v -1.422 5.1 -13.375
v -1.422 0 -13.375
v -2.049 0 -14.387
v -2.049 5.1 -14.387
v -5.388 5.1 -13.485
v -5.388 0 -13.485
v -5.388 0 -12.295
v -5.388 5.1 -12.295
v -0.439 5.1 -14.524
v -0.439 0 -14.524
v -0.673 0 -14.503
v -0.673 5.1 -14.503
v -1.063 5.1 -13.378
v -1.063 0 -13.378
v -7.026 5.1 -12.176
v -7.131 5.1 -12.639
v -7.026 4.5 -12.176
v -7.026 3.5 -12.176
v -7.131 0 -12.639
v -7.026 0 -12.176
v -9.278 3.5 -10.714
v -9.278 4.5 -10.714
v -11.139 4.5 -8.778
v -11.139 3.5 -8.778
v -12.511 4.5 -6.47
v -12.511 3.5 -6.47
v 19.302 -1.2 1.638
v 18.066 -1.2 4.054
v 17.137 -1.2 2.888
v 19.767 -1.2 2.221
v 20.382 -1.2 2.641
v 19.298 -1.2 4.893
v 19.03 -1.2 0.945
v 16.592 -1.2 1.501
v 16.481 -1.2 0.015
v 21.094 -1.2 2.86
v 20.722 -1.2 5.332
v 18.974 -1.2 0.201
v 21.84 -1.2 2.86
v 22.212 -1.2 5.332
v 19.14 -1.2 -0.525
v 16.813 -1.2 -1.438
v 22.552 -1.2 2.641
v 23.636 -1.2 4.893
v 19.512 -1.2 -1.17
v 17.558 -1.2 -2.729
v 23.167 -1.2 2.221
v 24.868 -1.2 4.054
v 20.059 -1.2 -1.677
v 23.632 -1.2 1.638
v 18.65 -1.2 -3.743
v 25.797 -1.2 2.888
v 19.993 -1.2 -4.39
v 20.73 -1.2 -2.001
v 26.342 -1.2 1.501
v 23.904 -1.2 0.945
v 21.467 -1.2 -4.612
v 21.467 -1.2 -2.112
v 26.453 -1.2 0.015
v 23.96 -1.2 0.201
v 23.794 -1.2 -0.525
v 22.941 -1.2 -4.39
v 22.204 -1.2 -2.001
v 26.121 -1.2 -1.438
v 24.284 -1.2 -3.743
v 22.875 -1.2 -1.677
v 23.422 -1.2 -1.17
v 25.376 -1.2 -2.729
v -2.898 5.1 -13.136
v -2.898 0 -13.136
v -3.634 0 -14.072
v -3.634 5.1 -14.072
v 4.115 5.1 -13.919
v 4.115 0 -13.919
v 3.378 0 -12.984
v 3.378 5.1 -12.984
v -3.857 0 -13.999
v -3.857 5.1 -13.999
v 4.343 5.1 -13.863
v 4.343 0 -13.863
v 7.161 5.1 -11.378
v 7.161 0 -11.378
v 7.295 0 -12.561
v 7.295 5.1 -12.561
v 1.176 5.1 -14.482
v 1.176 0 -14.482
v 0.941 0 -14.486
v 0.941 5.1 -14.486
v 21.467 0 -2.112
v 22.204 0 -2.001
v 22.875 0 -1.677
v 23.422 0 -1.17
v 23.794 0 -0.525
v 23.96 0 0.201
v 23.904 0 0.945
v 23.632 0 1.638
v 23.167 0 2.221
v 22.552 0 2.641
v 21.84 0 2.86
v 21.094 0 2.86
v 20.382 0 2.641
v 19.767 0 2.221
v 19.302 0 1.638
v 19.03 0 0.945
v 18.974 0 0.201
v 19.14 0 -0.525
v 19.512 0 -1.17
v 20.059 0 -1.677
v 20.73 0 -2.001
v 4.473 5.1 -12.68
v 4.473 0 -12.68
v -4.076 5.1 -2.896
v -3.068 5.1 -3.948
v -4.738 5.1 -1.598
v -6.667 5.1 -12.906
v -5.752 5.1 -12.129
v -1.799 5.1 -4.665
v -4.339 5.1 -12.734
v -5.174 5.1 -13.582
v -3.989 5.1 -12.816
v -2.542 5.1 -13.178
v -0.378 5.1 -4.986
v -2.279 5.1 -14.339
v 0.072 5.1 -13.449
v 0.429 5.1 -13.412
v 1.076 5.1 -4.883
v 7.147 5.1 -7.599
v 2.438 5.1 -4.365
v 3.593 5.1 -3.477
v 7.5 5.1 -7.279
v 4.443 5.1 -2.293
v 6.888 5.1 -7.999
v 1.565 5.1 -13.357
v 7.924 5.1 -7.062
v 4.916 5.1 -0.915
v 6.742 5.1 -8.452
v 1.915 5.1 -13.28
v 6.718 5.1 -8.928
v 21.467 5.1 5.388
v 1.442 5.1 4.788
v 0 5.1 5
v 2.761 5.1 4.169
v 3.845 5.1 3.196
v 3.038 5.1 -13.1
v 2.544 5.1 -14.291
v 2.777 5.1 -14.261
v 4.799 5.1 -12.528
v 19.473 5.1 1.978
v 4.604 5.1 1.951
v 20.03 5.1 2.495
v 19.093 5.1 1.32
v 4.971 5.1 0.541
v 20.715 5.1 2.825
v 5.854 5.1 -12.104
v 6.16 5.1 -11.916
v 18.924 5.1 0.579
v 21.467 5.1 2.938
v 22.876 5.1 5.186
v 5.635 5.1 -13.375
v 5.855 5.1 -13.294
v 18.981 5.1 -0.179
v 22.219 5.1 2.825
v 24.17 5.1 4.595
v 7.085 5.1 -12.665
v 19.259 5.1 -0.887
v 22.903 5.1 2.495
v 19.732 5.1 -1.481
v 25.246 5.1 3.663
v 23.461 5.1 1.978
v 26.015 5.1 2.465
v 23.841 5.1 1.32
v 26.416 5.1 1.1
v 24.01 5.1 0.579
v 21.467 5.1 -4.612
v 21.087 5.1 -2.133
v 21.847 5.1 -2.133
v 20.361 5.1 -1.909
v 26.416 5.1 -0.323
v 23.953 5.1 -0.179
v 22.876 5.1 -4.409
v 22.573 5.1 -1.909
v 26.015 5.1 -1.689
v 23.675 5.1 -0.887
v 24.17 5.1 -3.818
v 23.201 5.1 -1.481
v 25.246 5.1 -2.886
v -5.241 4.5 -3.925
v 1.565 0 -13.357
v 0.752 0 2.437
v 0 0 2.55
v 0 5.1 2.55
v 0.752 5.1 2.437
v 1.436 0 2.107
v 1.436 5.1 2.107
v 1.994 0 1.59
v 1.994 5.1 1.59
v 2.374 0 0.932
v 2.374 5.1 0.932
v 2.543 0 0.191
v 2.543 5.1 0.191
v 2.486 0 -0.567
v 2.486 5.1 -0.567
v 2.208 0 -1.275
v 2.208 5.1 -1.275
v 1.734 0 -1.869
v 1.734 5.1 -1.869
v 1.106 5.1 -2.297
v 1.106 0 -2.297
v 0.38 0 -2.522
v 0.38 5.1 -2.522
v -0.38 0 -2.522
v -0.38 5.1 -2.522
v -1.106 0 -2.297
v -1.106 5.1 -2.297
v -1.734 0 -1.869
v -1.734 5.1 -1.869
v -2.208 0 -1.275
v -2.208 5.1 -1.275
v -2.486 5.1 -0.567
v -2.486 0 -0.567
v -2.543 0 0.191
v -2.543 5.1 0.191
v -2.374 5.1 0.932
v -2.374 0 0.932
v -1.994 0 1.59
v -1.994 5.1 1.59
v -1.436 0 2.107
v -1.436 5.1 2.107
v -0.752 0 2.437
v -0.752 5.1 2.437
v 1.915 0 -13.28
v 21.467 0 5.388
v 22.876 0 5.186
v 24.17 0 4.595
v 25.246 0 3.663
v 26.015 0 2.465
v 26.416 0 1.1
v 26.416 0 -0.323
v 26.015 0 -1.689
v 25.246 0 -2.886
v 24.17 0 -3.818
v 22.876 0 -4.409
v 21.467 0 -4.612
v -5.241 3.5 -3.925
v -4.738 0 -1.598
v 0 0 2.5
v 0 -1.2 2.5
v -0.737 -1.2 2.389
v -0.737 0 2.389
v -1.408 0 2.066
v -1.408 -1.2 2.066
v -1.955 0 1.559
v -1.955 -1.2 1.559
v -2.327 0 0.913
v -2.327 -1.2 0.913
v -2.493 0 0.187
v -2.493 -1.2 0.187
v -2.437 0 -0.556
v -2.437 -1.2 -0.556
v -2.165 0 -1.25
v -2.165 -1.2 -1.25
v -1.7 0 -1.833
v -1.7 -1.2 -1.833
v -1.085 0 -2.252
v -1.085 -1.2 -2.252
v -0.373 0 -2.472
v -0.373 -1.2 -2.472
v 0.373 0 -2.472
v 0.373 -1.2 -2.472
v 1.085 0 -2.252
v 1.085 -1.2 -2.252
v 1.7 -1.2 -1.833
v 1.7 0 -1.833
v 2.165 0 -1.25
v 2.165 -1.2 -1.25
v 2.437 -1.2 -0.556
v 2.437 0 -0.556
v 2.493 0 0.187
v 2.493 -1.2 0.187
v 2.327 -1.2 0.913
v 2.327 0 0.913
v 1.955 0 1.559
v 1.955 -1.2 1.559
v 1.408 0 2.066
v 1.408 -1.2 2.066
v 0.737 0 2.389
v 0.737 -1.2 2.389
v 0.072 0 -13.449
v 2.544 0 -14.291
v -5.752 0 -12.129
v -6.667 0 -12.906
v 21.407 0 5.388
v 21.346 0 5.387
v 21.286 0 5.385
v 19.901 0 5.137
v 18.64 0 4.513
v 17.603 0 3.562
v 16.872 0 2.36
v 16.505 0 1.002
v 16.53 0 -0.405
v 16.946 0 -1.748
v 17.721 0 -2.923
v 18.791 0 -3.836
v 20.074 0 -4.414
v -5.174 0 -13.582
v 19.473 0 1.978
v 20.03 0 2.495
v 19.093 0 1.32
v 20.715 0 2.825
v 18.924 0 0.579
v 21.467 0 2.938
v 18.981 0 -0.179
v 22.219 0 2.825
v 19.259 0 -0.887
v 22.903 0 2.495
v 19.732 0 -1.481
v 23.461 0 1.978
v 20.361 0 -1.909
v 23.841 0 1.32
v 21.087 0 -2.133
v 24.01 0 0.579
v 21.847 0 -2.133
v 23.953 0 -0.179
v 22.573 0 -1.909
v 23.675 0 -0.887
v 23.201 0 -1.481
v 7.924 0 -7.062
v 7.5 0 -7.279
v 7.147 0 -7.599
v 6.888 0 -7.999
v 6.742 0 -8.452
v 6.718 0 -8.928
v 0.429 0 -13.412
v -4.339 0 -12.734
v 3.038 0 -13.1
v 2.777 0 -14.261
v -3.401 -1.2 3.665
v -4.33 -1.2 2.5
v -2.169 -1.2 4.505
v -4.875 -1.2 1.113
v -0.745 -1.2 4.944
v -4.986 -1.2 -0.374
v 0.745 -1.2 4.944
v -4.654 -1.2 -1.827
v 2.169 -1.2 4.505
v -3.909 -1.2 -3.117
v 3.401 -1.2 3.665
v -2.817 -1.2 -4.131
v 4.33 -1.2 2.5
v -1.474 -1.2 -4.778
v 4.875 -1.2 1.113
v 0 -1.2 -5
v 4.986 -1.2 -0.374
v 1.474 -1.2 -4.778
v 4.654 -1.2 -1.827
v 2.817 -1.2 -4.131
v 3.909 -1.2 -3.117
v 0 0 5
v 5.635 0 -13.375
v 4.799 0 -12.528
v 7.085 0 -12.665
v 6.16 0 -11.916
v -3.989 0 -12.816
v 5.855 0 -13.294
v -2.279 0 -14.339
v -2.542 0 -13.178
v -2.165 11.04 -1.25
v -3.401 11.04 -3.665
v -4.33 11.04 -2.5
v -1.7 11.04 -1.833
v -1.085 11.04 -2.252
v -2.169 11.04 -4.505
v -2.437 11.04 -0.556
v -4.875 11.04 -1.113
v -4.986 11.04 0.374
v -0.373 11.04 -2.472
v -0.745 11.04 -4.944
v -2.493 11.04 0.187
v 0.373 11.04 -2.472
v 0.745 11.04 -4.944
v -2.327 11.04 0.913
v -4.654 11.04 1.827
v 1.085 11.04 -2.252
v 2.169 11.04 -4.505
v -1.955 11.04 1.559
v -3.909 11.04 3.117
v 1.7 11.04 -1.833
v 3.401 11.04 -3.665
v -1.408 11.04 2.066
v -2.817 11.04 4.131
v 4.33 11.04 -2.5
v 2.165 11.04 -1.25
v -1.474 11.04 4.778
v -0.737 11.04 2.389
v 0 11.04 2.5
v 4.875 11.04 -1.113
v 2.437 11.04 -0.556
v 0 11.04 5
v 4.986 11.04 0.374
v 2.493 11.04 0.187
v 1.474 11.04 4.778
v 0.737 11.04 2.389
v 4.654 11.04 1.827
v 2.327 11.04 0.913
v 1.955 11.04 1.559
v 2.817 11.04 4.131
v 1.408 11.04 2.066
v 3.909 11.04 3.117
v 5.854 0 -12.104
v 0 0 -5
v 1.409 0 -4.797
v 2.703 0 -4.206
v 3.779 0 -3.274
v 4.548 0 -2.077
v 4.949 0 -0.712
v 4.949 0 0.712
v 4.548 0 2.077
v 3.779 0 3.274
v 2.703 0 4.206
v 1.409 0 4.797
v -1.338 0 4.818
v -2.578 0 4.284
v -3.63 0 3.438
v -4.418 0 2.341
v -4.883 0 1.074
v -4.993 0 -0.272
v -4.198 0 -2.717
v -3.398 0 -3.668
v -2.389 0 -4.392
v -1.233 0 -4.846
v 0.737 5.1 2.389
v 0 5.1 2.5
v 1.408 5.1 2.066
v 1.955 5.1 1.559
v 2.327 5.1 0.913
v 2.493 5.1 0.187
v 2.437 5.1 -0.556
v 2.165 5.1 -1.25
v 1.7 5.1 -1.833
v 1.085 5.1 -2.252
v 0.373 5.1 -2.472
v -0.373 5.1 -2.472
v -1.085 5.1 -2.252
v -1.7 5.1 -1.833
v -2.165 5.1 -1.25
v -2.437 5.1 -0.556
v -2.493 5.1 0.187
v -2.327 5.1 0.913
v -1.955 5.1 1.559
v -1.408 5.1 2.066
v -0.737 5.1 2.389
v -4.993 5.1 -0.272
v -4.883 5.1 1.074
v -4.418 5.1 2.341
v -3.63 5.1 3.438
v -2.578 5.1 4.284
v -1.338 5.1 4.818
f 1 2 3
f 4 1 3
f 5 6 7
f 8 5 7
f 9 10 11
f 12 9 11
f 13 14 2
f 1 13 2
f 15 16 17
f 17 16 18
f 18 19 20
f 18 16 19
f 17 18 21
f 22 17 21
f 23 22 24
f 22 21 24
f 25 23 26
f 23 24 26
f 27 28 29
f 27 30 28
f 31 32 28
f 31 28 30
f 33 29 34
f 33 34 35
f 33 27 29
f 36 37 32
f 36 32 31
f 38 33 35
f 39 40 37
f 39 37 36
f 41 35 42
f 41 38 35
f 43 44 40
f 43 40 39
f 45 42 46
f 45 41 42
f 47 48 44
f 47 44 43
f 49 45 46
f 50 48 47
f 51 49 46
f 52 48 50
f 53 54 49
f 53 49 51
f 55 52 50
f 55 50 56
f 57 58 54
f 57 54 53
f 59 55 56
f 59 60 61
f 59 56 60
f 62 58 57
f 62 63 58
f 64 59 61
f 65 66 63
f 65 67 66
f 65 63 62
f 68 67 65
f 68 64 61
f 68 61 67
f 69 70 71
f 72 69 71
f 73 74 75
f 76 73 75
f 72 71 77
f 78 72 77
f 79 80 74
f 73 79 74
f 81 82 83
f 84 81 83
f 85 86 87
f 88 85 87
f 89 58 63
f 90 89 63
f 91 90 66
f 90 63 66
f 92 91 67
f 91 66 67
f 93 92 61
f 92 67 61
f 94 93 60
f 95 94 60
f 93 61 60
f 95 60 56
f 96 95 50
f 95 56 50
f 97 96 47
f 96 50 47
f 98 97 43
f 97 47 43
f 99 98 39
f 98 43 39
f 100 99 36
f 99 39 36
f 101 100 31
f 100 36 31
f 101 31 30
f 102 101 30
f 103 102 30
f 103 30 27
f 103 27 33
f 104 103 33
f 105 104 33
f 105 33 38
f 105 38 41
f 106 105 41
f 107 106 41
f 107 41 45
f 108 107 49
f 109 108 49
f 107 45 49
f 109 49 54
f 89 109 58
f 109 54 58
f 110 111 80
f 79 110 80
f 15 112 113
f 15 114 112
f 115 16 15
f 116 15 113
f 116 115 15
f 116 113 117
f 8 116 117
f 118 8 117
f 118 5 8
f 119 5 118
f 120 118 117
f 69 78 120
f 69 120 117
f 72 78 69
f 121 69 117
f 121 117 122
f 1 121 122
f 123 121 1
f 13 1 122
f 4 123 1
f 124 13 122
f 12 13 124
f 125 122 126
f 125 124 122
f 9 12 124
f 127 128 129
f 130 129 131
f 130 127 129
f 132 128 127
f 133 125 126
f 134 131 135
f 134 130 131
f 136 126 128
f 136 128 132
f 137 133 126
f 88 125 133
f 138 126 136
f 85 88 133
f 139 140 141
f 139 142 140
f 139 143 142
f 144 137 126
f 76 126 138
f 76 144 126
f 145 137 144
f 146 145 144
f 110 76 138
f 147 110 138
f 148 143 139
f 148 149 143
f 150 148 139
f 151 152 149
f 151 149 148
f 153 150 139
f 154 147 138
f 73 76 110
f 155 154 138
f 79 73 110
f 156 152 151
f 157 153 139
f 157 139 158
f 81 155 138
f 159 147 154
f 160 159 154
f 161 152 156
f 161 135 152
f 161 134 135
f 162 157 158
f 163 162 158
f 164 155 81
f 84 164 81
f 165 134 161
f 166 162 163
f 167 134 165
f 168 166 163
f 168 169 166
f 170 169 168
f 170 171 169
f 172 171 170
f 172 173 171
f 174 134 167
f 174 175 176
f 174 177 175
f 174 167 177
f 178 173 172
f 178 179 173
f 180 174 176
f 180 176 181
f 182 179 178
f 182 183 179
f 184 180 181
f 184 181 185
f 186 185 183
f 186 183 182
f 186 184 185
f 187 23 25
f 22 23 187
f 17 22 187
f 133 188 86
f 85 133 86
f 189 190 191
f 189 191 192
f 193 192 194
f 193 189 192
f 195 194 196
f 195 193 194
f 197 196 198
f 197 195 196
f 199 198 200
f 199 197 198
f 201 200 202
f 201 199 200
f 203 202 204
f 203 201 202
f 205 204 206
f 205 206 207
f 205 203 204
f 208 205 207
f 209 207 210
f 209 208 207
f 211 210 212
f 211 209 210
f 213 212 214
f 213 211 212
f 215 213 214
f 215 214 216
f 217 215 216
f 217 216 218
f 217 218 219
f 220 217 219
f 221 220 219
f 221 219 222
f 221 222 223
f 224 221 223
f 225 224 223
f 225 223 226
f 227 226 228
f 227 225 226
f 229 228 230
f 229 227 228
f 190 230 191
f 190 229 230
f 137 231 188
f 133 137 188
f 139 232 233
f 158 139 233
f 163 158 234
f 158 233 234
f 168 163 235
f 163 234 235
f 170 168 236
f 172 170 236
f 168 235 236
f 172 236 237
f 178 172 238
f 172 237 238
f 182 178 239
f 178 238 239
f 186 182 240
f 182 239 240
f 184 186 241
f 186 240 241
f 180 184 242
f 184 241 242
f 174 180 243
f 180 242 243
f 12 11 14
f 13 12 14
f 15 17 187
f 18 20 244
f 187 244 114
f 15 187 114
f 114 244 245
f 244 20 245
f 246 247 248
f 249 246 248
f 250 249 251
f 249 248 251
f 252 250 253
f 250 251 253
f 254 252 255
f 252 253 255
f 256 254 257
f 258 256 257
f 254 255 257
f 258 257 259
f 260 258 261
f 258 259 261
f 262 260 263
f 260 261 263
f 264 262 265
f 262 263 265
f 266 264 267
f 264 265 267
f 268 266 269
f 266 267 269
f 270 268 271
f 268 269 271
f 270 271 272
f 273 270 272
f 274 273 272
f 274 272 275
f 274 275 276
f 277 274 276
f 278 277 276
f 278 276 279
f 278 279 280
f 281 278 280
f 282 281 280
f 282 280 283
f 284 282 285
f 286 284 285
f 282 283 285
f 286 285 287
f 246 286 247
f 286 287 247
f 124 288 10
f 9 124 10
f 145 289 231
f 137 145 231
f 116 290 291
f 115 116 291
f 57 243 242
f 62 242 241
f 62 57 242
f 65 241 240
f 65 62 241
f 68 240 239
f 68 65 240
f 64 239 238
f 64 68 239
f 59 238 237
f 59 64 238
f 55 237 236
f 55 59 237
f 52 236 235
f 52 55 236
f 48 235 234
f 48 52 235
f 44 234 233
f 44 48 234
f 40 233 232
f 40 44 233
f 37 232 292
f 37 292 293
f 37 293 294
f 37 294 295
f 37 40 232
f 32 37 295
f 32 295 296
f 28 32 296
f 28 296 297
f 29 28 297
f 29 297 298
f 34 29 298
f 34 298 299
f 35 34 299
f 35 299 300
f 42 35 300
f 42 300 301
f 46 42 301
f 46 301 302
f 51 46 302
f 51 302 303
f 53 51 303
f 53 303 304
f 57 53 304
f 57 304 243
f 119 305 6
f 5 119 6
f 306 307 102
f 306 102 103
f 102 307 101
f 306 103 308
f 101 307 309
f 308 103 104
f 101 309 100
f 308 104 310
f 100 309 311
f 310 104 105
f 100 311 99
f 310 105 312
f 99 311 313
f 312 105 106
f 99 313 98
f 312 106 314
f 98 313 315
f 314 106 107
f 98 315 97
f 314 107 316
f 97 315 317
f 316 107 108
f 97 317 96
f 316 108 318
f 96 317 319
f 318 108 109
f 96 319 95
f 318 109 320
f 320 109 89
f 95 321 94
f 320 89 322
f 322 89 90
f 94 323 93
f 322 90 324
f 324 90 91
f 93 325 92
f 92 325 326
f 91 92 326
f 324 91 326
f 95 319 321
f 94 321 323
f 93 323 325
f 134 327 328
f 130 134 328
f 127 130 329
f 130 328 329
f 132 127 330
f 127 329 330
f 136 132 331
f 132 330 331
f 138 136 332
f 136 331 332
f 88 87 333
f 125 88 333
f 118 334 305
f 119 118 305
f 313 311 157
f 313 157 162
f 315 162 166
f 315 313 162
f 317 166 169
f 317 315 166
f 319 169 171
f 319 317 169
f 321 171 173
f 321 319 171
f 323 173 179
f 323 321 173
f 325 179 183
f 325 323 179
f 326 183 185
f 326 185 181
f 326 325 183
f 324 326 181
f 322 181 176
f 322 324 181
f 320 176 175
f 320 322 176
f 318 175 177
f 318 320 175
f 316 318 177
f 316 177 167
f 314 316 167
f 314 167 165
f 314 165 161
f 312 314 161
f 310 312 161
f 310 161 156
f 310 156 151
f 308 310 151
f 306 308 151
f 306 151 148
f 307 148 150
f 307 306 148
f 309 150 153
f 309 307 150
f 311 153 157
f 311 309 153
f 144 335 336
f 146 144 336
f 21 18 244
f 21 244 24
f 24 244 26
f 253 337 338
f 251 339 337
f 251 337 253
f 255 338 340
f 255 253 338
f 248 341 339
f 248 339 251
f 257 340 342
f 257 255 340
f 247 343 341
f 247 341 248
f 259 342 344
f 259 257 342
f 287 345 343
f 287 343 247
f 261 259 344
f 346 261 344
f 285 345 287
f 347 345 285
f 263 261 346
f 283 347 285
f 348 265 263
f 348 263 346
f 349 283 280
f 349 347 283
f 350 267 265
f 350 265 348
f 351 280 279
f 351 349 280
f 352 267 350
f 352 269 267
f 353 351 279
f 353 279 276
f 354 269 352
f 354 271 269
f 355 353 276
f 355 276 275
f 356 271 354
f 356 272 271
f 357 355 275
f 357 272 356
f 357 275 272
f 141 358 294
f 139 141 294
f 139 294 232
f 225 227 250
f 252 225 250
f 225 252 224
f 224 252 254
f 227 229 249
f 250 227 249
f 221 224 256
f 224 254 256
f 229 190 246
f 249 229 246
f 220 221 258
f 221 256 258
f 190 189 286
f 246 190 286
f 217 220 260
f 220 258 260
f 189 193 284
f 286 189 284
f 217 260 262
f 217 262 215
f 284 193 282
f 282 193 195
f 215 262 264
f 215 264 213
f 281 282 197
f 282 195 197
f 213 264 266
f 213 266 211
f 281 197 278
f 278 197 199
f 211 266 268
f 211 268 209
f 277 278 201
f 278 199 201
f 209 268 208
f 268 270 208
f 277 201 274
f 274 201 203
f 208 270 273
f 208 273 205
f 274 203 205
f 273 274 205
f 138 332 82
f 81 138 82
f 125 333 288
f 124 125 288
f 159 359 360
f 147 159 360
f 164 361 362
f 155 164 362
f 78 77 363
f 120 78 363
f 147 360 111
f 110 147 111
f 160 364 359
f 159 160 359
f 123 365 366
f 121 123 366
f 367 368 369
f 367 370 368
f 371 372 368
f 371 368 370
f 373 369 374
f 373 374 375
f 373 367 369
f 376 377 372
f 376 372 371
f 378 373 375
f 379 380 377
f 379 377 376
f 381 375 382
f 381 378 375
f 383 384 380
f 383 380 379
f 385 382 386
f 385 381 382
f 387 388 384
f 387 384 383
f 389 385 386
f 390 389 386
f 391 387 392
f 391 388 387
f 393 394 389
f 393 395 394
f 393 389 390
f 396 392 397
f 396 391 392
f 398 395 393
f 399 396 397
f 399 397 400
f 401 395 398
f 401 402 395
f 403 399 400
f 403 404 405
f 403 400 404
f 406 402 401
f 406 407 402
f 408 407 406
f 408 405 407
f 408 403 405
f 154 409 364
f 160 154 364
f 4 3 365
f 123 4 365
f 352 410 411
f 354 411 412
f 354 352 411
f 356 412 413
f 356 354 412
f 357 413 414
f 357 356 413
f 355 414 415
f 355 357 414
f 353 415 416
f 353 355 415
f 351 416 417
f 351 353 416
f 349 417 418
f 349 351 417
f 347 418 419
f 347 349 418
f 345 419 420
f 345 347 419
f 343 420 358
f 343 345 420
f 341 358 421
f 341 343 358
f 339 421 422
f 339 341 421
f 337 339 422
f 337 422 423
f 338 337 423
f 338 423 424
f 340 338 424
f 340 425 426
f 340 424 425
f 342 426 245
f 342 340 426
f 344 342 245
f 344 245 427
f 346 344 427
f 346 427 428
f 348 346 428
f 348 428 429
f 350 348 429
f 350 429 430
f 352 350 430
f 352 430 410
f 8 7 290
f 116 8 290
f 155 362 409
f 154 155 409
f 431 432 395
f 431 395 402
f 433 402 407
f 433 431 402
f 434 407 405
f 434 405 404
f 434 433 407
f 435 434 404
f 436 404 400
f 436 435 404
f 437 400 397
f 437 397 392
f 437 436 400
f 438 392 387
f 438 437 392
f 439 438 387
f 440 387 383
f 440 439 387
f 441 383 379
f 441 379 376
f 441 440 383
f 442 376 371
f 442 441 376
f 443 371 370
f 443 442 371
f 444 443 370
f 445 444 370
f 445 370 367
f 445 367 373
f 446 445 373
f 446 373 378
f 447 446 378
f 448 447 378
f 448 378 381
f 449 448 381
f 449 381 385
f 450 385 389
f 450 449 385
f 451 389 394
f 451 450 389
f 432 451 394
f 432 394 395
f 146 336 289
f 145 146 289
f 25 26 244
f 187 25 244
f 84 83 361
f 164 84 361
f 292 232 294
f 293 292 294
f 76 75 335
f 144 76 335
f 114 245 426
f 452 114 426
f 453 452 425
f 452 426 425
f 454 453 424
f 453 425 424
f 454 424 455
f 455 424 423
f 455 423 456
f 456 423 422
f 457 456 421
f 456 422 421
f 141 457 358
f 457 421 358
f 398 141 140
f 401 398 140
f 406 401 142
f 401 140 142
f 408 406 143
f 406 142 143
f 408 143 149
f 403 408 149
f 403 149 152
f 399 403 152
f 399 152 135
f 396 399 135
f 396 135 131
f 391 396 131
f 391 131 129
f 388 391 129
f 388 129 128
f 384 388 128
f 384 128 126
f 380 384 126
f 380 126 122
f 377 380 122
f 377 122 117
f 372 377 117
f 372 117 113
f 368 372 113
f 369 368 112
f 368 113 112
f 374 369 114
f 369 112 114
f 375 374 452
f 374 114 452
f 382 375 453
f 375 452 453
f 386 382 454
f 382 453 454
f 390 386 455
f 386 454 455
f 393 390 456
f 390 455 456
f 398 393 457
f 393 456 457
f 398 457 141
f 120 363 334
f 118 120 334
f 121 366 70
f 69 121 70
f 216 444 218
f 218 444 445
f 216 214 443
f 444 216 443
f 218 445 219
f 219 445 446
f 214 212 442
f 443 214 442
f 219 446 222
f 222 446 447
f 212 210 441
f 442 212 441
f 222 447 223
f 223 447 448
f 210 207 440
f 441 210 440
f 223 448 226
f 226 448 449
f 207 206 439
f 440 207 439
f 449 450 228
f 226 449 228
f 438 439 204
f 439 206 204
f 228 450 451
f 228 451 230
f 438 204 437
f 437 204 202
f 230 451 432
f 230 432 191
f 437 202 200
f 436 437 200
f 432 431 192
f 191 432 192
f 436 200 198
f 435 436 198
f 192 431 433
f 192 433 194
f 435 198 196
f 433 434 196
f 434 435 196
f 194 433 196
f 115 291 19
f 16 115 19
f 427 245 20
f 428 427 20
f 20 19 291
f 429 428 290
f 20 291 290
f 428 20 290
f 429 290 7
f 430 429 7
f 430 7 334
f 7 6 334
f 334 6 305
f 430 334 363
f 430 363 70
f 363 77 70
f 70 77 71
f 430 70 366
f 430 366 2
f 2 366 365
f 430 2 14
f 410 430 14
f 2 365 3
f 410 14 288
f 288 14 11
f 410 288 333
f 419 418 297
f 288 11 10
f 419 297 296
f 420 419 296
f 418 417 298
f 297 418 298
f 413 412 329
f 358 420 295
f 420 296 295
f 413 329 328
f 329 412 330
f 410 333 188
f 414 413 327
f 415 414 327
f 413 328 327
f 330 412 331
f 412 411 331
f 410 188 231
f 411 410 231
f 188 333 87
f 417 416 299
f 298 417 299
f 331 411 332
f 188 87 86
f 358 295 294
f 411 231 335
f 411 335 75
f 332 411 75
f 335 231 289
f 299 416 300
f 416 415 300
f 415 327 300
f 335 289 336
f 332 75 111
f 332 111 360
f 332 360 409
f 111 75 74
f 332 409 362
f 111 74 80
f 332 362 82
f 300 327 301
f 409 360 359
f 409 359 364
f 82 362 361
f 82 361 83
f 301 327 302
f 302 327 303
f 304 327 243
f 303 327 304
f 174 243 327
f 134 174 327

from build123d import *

# Parameters (mm, degrees)
SKETCH_1_R          = 2.5499999999999994
SKETCH_1_R_2        = 2.5499999999999976
EXTRUDE_1_DEPTH     = 5.1
SKETCH_2_R          = 4.999999999999998
SKETCH_2_R_2        = 2.5
EXTRUDE_2_DEPTH     = 5.94
CUT_EXTRUDE_1_DEPTH = 3.5
CUT_EXTRUDE_START   = -0.6
CUT_EXTRUDE_3_DEPTH = 0.6
EXTRUDE_START       = 1.2
SKETCH_6_R          = 4.999999999999998
SKETCH_6_R_2        = 2.5
SKETCH_6_R_3        = 5
SKETCH_6_R_4        = 2.4999999999999987
EXTRUDE_4_DEPTH     = 1.2


with BuildPart() as part:
    # Эскиз1 → Бобышка-Вытянуть1 (new body)
    with BuildSketch(Plane(origin=(0, 0, 0), x_dir=(1, 0, 0), z_dir=(0, 1, 0))):
        with BuildLine():
            Line((6.718023264525762, 8.928267668376021), (7.161238337218641, 11.37785065819786))
            Line((7.161238337218641, 11.37785065819786), (7.294846288705666, 12.560700282216452))
            Line((7.294846288705666, 12.560700282216452), (7.085001061393901, 12.665407082864023))
            Line((7.085001061393901, 12.665407082864023), (6.15987792536569, 11.916319971156167))
            Line((6.15987792536569, 11.916319971156167), (5.853623131200735, 12.10383694173367))
            Line((5.853623131200735, 12.10383694173367), (5.855060736117009, 13.29420757772634))
            Line((5.855060736117009, 13.29420757772634), (5.634886528714601, 13.37496556136943))
            Line((5.634886528714601, 13.37496556136943), (4.798663389284832, 12.527784837542624))
            Line((4.798663389284832, 12.527784837542624), (4.473480547373511, 12.680135526842204))
            Line((4.473480547373511, 12.680135526842204), (4.342730025112913, 13.863304415323501))
            Line((4.342730025112913, 13.863304415323501), (4.114949999467502, 13.919114749889351))
            Line((4.114949999467502, 13.919114749889351), (3.3779694438823102, 12.984318526945106))
            Line((3.3779694438823102, 12.984318526945106), (3.0378804853992434, 13.099618628946285))
            Line((3.0378804853992434, 13.099618628946285), (2.776558986480811, 14.260952083189514))
            Line((2.776558986480811, 14.260952083189514), (2.54399037483231, 14.291124494483034))
            Line((2.54399037483231, 14.291124494483034), (1.9153675367628848, 13.280274532718662))
            Line((1.9153675367628848, 13.280274532718662), (1.56457875493138, 13.35709799101592))
            Line((1.56457875493138, 13.35709799101592), (1.175918359734634, 14.482232389631033))
            Line((1.175918359734634, 14.482232389631033), (0.9414376205823001, 14.486393698794194))
            Line((0.9414376205823001, 14.486393698794194), (0.4289474421954887, 13.411992407470256))
            Line((0.42894744219548875, 13.411992407470256), (0.07179746795026506, 13.449389053044667))
            Line((0.07179746795026506, 13.449389053044667), (-0.4393947883485354, 14.524408492330128))
            Line((-0.43939478834853546, 14.524408492330128), (-0.6728875469021285, 14.502507231398162))
            Line((-0.6728875469021285, 14.502507231398162), (-1.062906477097084, 13.377843036257644))
            Line((-1.062906477097084, 13.377843036257644), (-1.4220003362283888, 13.375350339371238))
            Line((-1.4220003362283888, 13.375350339371238), (-2.049401918098927, 14.386958748197415))
            Line((-2.049401918098927, 14.386958748197415), (-2.279018807507275, 14.33926579666565))
            Line((-2.279018807507275, 14.33926579666565), (-2.5417426516817105, 13.178248785832608))
            Line((-2.5417426516817105, 13.178248785832608), (-2.898339045786024, 13.13589757669542))
            Line((-2.898339045786024, 13.13589757669542), (-3.6341901158202092, 14.071583165165732))
            Line((-3.6341901158202092, 14.071583165165732), (-3.8570911851181764, 13.998688399693854))
            Line((-3.8570911851181764, 13.998688399693854), (-3.989270518385492, 12.815678280718325))
            Line((-3.989270518385492, 12.815678280718325), (-4.3389589867331635, 12.733992368173748))
            Line((-4.3389589867331635, 12.733992368173748), (-5.174158380979493, 13.582182376127184))
            Line((-5.174158380979493, 13.582182376127184), (-5.3875867419063175, 13.48498737481814))
            Line((-5.3875867419063175, 13.48498737481814), (-5.3875867419063175, 12.2946158707315))
            Line((-5.3875867419063175, 12.2946158707315), (-5.751610974482103, 12.12883970299033))
            Line((-5.751610974482103, 12.12883970299033), (-6.666748566138722, 12.905854249247858))
            Line((-6.666748566138722, 12.905854249247858), (-7.13096440438616, 12.63943472468846))
            Line((-7.13096440438616, 12.63943472468846), (-7.025830916712447, 12.175864106991055))
            ThreePointArc((-7.025830916712449, 12.175864106991055), (-10.264322646127633, 9.799709596012173), (-12.51111253150909, 6.470163958468902))
            Line((-12.51111253150909, 6.470163958468902), (-5.241071220187256, 3.924995297345621))
            Line((-5.241071220187256, 3.924995297345621), (-4.737733567637334, 1.5980865565051285))
            ThreePointArc((-4.737733567637334, 1.5980865565051288), (-4.061430338102922, -2.9162962141622684), (1.55e-15, -5))
            Line((2.2e-16, -5), (21.46693589645179, -5.388260461869603))
            ThreePointArc((21.46693589645179, -5.388260461869605), (26.46693589645179, -0.3882604618696045), (21.46693589645179, 4.611739538130397))
            Line((21.46693589645179, 4.611739538130397), (7.924308406385933, 7.062073595968816))
            ThreePointArc((7.924308406385932, 7.062073595968816), (7.00463576208043, 7.790569444059032), (6.718023264525762, 8.928267668376021))
        make_face()
        with Locations(Location((21.46693589645179, -0.3882604618696021, 0), (0, 0, 270))):
            Circle(SKETCH_1_R, mode=Mode.SUBTRACT)
        with Locations(Location((2.78e-15, 1.83e-15, 0), (0, 0, 270))):
            Circle(SKETCH_1_R_2, mode=Mode.SUBTRACT)
    extrude(amount=EXTRUDE_1_DEPTH)

    # Эскиз2 → Бобышка-Вытянуть2 (add)
    with BuildSketch(Plane(origin=(0, 5.1, 0), x_dir=(1, 0, 0), z_dir=(0, 1, 0))):
        with Locations(Location((0, 0, 0), (0, 0, 270))):
            Circle(SKETCH_2_R)
        with Locations(Location((0, 0, 0), (0, 0, 270))):
            Circle(SKETCH_2_R_2, mode=Mode.SUBTRACT)
    extrude(amount=EXTRUDE_2_DEPTH)

    # Эскиз4 → Вырез-Вытянуть1 (cut)
    with BuildSketch(Plane.XZ):
        with BuildLine():
            Line((-5.241071220187255, -3.924995297345621), (-7.025830916712447, -12.175864106991055))
            ThreePointArc((-7.025830916712447, -12.175864106991055), (-10.264322646127628, -9.799709596012166), (-12.511112531509088, -6.470163958468901))
            Line((-12.511112531509088, -6.470163958468901), (-5.241071220187255, -3.924995297345621))
        make_face()
    extrude(amount=-CUT_EXTRUDE_1_DEPTH, mode=Mode.SUBTRACT)

    # Эскиз5 → Вырез-Вытянуть3 (cut)
    with BuildSketch(Plane(origin=(0, 5.1, 0), x_dir=(1, 0, 0), z_dir=(0, 1, 0)).offset(CUT_EXTRUDE_START)):
        with BuildLine():
            Line((-5.241071220187255, 3.924995297345621), (-7.025830916712447, 12.175864106991055))
            ThreePointArc((-7.025830916712447, 12.175864106991055), (-10.264322646127628, 9.799709596012168), (-12.511112531509088, 6.470163958468901))
            Line((-12.511112531509088, 6.470163958468901), (-5.241071220187255, 3.924995297345621))
        make_face()
    extrude(amount=CUT_EXTRUDE_3_DEPTH, mode=Mode.SUBTRACT)

    # Эскиз6 → Бобышка-Вытянуть4 (add)
    # profile 1 of 2: a face of its own
    with BuildSketch(Plane.XZ.offset(EXTRUDE_START)):
        with Locations(Location((0, 0, 0), (0, 0, 270))):
            Circle(SKETCH_6_R)
        with Locations(Location((0, 0, 0), (0, 0, 90))):
            Circle(SKETCH_6_R_2, mode=Mode.SUBTRACT)
    # profile 2 of 2: a face of its own
    with BuildSketch(Plane.XZ.offset(EXTRUDE_START)):
        with Locations(Location((21.46693589645179, 0.38826046186960295, 0), (0, 0, 270))):
            Circle(SKETCH_6_R_3)
        with Locations(Location((21.46693589645179, 0.38826046186960295, 0), (0, 0, 270))):
            Circle(SKETCH_6_R_4, mode=Mode.SUBTRACT)
    extrude(amount=-EXTRUDE_4_DEPTH)


solid = part.part
